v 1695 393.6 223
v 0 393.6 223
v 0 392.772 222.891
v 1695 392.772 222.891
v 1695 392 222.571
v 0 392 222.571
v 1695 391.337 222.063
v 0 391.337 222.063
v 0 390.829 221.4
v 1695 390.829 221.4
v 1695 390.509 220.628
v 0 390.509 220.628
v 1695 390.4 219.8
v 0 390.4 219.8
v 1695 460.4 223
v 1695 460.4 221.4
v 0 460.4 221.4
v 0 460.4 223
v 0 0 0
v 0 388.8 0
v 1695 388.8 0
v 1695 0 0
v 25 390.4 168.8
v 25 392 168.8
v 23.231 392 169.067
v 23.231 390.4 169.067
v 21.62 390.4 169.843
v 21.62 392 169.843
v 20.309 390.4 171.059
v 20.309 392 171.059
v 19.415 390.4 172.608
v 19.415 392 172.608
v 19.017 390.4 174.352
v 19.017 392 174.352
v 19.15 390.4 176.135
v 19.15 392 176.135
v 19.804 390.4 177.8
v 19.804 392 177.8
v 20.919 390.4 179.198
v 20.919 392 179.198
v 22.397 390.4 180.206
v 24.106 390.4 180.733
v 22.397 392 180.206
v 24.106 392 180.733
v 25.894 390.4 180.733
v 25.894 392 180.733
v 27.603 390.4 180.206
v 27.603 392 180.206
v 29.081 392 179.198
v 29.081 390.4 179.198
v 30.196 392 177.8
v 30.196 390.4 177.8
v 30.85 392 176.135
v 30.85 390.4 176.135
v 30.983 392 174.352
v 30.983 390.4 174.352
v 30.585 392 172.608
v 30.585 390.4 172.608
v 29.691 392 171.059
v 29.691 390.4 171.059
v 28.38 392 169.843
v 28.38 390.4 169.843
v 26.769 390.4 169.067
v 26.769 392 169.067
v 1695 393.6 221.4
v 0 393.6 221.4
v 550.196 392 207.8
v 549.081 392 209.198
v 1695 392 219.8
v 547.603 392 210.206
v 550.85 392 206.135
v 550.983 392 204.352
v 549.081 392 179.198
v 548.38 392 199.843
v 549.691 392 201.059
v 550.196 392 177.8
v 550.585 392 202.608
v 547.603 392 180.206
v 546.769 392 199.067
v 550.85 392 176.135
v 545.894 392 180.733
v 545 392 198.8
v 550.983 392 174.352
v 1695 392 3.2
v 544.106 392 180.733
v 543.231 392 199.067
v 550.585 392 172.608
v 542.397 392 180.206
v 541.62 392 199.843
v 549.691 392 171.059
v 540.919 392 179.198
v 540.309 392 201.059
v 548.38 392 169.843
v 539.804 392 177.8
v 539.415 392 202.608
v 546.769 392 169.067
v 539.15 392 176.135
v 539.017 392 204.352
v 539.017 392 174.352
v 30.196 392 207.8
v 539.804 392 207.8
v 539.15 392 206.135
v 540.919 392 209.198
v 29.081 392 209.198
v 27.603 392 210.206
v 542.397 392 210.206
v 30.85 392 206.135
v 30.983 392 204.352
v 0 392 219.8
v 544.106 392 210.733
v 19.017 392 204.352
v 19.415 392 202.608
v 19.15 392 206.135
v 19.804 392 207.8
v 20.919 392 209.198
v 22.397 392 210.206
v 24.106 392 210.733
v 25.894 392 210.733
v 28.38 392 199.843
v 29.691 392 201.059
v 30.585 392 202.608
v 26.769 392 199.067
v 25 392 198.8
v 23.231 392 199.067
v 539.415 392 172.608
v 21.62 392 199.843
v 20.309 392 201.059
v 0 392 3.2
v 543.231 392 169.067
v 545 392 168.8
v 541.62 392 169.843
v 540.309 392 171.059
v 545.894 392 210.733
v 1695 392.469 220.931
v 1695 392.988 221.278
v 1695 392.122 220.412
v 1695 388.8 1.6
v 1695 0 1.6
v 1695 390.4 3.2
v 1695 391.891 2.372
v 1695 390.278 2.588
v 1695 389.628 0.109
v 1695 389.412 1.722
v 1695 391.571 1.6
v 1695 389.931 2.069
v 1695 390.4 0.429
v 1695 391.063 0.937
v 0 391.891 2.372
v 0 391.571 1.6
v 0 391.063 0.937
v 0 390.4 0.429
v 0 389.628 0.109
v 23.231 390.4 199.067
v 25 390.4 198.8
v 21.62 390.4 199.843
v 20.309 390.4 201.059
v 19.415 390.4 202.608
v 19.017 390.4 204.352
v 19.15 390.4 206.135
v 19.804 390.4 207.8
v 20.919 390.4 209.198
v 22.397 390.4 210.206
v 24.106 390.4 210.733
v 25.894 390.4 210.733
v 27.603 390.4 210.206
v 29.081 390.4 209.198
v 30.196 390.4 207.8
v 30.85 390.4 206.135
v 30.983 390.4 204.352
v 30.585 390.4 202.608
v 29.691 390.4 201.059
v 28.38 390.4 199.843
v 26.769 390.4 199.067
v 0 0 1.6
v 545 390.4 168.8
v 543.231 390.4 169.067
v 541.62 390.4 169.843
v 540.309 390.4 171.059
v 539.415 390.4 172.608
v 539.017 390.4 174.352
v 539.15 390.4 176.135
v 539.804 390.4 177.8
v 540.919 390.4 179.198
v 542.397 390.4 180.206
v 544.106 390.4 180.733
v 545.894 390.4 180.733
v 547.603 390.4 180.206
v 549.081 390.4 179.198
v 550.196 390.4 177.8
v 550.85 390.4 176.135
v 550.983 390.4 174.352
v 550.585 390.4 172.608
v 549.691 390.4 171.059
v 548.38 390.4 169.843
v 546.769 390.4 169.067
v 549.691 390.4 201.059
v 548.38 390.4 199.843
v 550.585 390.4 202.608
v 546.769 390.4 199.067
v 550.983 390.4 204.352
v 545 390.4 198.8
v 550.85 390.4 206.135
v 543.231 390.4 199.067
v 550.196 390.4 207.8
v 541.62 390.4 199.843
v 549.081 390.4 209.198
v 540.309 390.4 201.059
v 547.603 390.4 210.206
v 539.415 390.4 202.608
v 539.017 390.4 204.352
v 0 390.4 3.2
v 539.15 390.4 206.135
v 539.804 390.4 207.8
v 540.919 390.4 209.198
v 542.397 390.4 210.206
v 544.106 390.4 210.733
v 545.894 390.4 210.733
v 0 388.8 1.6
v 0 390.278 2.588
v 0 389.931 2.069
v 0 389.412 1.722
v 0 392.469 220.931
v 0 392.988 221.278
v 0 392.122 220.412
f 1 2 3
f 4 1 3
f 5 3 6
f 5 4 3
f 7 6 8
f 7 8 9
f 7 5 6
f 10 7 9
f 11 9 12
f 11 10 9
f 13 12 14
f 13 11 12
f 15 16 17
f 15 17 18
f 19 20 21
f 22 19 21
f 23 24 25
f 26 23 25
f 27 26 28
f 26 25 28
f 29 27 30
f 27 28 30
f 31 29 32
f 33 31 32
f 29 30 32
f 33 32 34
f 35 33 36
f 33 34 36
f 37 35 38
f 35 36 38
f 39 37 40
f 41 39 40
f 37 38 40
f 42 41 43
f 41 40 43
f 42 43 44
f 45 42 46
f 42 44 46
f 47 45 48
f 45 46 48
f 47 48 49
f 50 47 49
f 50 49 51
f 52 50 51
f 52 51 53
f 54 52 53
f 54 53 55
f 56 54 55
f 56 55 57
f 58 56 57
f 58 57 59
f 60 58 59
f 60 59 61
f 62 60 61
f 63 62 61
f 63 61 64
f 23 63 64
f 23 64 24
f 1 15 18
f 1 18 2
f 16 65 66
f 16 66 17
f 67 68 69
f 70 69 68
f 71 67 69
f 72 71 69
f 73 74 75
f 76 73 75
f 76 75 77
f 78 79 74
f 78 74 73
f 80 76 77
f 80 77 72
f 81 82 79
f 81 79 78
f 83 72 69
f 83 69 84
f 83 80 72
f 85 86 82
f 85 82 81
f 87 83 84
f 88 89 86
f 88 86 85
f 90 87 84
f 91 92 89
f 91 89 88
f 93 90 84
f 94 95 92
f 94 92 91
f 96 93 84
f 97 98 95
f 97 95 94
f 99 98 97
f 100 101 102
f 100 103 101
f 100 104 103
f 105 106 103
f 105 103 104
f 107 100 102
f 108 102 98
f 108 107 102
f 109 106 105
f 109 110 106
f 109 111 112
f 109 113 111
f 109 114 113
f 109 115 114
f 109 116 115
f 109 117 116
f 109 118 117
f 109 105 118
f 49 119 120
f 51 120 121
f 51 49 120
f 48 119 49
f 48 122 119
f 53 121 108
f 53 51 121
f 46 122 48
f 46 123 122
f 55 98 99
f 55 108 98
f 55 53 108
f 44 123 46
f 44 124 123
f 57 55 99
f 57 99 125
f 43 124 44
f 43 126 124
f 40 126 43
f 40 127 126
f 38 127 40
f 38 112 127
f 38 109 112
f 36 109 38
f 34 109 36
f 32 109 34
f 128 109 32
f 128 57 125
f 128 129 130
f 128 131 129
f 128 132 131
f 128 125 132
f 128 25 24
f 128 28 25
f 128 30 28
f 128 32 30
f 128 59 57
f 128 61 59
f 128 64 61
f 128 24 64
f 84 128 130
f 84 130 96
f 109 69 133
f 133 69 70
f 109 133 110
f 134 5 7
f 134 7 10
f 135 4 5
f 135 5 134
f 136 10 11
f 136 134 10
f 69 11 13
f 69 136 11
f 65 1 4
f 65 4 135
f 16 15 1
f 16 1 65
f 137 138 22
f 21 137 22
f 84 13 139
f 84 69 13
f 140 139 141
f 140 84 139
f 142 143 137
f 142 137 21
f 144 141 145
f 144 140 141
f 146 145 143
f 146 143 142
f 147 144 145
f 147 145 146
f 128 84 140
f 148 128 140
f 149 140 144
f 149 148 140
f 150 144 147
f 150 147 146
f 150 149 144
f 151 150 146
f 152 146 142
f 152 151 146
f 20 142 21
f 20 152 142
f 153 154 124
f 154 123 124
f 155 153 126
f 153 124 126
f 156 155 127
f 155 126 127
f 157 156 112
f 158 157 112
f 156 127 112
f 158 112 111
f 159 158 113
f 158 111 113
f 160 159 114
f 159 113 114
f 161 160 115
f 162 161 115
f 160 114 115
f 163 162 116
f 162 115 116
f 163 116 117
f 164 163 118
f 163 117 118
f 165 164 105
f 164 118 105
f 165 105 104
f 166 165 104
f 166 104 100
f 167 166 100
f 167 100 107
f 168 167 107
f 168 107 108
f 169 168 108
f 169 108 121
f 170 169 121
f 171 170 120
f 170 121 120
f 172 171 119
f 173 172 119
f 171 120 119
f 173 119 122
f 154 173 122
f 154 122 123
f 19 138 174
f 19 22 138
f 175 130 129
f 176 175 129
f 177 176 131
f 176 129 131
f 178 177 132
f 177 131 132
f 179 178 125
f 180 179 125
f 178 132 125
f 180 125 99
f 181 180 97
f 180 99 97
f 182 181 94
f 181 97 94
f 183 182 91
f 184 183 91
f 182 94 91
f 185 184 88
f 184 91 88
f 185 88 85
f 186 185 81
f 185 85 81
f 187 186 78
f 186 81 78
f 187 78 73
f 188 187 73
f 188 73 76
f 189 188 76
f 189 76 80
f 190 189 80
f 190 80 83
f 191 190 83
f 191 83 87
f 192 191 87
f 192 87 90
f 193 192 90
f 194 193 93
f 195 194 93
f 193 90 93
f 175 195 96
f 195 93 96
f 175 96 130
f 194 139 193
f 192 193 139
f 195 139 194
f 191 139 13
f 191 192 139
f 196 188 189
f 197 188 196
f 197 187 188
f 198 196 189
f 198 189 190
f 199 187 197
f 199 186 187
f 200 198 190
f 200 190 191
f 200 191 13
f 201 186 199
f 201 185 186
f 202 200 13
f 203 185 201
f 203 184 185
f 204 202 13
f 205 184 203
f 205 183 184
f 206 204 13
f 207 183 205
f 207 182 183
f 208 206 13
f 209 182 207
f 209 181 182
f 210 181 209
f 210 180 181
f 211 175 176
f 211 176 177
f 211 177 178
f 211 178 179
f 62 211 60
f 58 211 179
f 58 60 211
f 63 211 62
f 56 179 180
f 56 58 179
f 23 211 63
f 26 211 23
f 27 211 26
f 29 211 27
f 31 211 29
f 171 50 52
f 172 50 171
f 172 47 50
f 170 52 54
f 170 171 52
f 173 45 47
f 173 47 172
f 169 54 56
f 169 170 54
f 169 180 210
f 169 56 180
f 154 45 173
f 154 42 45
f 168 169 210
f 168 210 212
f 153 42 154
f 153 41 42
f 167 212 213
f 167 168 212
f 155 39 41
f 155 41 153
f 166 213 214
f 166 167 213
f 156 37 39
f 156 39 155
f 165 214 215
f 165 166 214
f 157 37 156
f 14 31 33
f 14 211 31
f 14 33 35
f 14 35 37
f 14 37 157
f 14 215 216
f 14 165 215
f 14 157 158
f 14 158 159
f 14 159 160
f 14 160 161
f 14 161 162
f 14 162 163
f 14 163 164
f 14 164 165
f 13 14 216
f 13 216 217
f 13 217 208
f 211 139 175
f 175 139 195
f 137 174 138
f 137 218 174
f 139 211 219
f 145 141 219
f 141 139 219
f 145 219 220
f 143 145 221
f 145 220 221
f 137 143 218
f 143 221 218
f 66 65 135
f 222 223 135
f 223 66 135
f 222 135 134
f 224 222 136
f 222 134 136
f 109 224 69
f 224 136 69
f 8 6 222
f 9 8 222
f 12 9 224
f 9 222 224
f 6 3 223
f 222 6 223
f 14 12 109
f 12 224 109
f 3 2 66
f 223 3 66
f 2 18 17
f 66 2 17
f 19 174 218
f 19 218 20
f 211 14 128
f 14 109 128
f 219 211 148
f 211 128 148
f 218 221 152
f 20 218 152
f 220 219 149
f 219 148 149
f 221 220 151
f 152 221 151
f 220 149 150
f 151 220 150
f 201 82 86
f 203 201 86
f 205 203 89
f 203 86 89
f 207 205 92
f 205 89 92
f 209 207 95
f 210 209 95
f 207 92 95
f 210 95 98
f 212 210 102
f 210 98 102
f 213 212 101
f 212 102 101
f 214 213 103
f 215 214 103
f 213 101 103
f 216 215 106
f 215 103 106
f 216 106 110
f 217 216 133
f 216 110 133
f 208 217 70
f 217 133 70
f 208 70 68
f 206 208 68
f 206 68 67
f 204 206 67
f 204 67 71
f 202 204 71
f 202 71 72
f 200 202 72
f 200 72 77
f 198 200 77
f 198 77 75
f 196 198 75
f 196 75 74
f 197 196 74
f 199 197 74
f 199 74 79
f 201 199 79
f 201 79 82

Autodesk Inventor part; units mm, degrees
ref_plane "YZ Plane" through (0, 0, 0) normal (1, 0, 0) x (0, 1, 0)
ref_plane "XZ Plane" through (0, 0, 0) normal (0, 1, 0) x (-1, 0, 0)
ref_plane "XY Plane" through (0, 0, 0) normal (0, 0, 1) x (1, 0, 0)
sketch "Sketch1" plane through (0, 0, 0) normal (0, 0, 1) x (1, 0, 0)
  line L0 (0, 0) -> (0, 392)
  line L1 (0, 392) -> (1695, 392)
  line L2 (1695, 392) -> (1695, 0)
  line L3 (1695, 0) -> (0, 0)
  dimension "d0" = 392
  dimension "d1" = 1695
extrude "Plate1" add sketch "Sketch1" along normal blind 1.6
sketch "Sketch2" plane through (1695, 390.4, 0) normal (0, 1, 0) x (-1, 0, 0)
  line L0 (1695, 0) -> (0, 0)
  line L1 (0, 0) -> (0, -223)
  line L2 (0, -223) -> (1695, -223)
  line L3 (1695, -223) -> (1695, 0)
edge flange "Flange1" height 223 angle 90 thickness 1.6 bend radius 1.6 thickness toward (0, 1, 0) relief tear relief width 1.6 relief depth 0.8 edges at (847.5, 392, 0) wall of the first edge with corners at (0, 390.4, 0) (1695, 390.4, 0) (1695, 390.4, 223) (0, 390.4, 223)
bend "Bend1"
corner "Corner1"
sketch "Sketch3" plane through (0, 390.4, 221.4) normal (0, 0, 1) x (1, 0, 0)
  line L0 (1695, 0) -> (0, 0)
  line L1 (0, 0) -> (0, -70)
  line L2 (0, -70) -> (1695, -70)
  line L3 (1695, -70) -> (1695, 0)
edge flange "Flange2" height 70 angle -90 thickness 1.6 bend radius 1.6 thickness toward (0, 0, 1) relief tear relief width 1.6 relief depth 0.8 edges at (847.5, 390.4, 223) wall of the first edge with corners at (1695, 390.4, 221.4) (0, 390.4, 221.4) (0, 460.4, 221.4) (1695, 460.4, 221.4)
bend "Bend2"
corner "Corner2"
sketch "Sketch4" plane through (0, 390.4, 3.2) normal (0, -1, 0) x (1, 0, 0)
  line L0 (0, 0) -> (0, 216.6) projected
  line L1 (0, 216.6) -> (0, 156.6)
  line L2 (0, 156.6) -> (1695, 156.6)
  line L3 (1695, 216.6) -> (1695, 0) projected
  line L4 (1695, 216.6) -> (0, 216.6) projected
  line L5 (1695, 156.6) -> (1695, 216.6)
  line L6 (1695, 216.6) -> (0, 216.6)
  circle A0 centre (25, 201.6) radius 6
  circle A1 centre (25, 171.6) radius 6
  circle A2 centre (545, 201.6) radius 6
  circle A3 centre (545, 171.6) radius 6
  line L7 (0, 156.6) -> (570, 156.6)
  line L8 (570, 156.6) -> (570, 216.6)
  point P0 (0, -3.2)
  dimension "d23" = 60
  dimension "d24" = 12
  dimension "d25" = 12
  dimension "d26" = 25
  dimension "d27" = 25
  dimension "d28" = 15
  dimension "d29" = 15
  dimension "d30" = 12
  dimension "d31" = 12
  dimension "d41" = 570
  dimension "d42" = 15
  dimension "d43" = 15
  dimension "d44" = 25
  dimension "d45" = 25
hole "Hole1" at (25, 390.4, 204.8) at (25, 390.4, 174.8) at (545, 390.4, 204.8) at (545, 390.4, 174.8) direction (0, 1, 0) diameter 12 end through all
equation "\"d39\" = Thickness"
equation "\"d3\" = BendReliefWidth"
equation "\"d4\" = BendReliefDepth"
equation "\"d5\" = MinimumRemnant"
equation "\"d6\" = BendRadius"
equation "\"d9\" = BendRadius"
equation "\"d10\" = CornerReliefSize"
equation "\"d11\" = GapSize"
equation "\"d12\" = JacobiRadiusSize"
equation "\"d13\" = BendReliefWidth"
equation "\"d14\" = BendReliefDepth"
equation "\"d15\" = MinimumRemnant"
equation "\"d16\" = BendRadius"
equation "\"d19\" = BendRadius"
equation "\"d20\" = CornerReliefSize"
equation "\"d21\" = GapSize"
equation "\"d22\" = JacobiRadiusSize"
equation "\"BendRadius\" = Thickness"
equation "\"BendReliefWidth\" = Thickness"
equation "\"BendReliefDepth\" = 0.5 * Thickness"
equation "\"CornerReliefSize\" = 4 * Thickness"
equation "\"MinimumRemnant\" = 2 * Thickness"
equation "\"TransitionRadius\" = BendRadius"
equation "\"JacobiRadiusSize\" = BendRadius"
equation "\"GapSize\" = Thickness"
equation "\"d2\" = BendRadius"
equation "\"Thickness\" = 1.6"
properties part number "MC Part4" material "Steel, Mild"
